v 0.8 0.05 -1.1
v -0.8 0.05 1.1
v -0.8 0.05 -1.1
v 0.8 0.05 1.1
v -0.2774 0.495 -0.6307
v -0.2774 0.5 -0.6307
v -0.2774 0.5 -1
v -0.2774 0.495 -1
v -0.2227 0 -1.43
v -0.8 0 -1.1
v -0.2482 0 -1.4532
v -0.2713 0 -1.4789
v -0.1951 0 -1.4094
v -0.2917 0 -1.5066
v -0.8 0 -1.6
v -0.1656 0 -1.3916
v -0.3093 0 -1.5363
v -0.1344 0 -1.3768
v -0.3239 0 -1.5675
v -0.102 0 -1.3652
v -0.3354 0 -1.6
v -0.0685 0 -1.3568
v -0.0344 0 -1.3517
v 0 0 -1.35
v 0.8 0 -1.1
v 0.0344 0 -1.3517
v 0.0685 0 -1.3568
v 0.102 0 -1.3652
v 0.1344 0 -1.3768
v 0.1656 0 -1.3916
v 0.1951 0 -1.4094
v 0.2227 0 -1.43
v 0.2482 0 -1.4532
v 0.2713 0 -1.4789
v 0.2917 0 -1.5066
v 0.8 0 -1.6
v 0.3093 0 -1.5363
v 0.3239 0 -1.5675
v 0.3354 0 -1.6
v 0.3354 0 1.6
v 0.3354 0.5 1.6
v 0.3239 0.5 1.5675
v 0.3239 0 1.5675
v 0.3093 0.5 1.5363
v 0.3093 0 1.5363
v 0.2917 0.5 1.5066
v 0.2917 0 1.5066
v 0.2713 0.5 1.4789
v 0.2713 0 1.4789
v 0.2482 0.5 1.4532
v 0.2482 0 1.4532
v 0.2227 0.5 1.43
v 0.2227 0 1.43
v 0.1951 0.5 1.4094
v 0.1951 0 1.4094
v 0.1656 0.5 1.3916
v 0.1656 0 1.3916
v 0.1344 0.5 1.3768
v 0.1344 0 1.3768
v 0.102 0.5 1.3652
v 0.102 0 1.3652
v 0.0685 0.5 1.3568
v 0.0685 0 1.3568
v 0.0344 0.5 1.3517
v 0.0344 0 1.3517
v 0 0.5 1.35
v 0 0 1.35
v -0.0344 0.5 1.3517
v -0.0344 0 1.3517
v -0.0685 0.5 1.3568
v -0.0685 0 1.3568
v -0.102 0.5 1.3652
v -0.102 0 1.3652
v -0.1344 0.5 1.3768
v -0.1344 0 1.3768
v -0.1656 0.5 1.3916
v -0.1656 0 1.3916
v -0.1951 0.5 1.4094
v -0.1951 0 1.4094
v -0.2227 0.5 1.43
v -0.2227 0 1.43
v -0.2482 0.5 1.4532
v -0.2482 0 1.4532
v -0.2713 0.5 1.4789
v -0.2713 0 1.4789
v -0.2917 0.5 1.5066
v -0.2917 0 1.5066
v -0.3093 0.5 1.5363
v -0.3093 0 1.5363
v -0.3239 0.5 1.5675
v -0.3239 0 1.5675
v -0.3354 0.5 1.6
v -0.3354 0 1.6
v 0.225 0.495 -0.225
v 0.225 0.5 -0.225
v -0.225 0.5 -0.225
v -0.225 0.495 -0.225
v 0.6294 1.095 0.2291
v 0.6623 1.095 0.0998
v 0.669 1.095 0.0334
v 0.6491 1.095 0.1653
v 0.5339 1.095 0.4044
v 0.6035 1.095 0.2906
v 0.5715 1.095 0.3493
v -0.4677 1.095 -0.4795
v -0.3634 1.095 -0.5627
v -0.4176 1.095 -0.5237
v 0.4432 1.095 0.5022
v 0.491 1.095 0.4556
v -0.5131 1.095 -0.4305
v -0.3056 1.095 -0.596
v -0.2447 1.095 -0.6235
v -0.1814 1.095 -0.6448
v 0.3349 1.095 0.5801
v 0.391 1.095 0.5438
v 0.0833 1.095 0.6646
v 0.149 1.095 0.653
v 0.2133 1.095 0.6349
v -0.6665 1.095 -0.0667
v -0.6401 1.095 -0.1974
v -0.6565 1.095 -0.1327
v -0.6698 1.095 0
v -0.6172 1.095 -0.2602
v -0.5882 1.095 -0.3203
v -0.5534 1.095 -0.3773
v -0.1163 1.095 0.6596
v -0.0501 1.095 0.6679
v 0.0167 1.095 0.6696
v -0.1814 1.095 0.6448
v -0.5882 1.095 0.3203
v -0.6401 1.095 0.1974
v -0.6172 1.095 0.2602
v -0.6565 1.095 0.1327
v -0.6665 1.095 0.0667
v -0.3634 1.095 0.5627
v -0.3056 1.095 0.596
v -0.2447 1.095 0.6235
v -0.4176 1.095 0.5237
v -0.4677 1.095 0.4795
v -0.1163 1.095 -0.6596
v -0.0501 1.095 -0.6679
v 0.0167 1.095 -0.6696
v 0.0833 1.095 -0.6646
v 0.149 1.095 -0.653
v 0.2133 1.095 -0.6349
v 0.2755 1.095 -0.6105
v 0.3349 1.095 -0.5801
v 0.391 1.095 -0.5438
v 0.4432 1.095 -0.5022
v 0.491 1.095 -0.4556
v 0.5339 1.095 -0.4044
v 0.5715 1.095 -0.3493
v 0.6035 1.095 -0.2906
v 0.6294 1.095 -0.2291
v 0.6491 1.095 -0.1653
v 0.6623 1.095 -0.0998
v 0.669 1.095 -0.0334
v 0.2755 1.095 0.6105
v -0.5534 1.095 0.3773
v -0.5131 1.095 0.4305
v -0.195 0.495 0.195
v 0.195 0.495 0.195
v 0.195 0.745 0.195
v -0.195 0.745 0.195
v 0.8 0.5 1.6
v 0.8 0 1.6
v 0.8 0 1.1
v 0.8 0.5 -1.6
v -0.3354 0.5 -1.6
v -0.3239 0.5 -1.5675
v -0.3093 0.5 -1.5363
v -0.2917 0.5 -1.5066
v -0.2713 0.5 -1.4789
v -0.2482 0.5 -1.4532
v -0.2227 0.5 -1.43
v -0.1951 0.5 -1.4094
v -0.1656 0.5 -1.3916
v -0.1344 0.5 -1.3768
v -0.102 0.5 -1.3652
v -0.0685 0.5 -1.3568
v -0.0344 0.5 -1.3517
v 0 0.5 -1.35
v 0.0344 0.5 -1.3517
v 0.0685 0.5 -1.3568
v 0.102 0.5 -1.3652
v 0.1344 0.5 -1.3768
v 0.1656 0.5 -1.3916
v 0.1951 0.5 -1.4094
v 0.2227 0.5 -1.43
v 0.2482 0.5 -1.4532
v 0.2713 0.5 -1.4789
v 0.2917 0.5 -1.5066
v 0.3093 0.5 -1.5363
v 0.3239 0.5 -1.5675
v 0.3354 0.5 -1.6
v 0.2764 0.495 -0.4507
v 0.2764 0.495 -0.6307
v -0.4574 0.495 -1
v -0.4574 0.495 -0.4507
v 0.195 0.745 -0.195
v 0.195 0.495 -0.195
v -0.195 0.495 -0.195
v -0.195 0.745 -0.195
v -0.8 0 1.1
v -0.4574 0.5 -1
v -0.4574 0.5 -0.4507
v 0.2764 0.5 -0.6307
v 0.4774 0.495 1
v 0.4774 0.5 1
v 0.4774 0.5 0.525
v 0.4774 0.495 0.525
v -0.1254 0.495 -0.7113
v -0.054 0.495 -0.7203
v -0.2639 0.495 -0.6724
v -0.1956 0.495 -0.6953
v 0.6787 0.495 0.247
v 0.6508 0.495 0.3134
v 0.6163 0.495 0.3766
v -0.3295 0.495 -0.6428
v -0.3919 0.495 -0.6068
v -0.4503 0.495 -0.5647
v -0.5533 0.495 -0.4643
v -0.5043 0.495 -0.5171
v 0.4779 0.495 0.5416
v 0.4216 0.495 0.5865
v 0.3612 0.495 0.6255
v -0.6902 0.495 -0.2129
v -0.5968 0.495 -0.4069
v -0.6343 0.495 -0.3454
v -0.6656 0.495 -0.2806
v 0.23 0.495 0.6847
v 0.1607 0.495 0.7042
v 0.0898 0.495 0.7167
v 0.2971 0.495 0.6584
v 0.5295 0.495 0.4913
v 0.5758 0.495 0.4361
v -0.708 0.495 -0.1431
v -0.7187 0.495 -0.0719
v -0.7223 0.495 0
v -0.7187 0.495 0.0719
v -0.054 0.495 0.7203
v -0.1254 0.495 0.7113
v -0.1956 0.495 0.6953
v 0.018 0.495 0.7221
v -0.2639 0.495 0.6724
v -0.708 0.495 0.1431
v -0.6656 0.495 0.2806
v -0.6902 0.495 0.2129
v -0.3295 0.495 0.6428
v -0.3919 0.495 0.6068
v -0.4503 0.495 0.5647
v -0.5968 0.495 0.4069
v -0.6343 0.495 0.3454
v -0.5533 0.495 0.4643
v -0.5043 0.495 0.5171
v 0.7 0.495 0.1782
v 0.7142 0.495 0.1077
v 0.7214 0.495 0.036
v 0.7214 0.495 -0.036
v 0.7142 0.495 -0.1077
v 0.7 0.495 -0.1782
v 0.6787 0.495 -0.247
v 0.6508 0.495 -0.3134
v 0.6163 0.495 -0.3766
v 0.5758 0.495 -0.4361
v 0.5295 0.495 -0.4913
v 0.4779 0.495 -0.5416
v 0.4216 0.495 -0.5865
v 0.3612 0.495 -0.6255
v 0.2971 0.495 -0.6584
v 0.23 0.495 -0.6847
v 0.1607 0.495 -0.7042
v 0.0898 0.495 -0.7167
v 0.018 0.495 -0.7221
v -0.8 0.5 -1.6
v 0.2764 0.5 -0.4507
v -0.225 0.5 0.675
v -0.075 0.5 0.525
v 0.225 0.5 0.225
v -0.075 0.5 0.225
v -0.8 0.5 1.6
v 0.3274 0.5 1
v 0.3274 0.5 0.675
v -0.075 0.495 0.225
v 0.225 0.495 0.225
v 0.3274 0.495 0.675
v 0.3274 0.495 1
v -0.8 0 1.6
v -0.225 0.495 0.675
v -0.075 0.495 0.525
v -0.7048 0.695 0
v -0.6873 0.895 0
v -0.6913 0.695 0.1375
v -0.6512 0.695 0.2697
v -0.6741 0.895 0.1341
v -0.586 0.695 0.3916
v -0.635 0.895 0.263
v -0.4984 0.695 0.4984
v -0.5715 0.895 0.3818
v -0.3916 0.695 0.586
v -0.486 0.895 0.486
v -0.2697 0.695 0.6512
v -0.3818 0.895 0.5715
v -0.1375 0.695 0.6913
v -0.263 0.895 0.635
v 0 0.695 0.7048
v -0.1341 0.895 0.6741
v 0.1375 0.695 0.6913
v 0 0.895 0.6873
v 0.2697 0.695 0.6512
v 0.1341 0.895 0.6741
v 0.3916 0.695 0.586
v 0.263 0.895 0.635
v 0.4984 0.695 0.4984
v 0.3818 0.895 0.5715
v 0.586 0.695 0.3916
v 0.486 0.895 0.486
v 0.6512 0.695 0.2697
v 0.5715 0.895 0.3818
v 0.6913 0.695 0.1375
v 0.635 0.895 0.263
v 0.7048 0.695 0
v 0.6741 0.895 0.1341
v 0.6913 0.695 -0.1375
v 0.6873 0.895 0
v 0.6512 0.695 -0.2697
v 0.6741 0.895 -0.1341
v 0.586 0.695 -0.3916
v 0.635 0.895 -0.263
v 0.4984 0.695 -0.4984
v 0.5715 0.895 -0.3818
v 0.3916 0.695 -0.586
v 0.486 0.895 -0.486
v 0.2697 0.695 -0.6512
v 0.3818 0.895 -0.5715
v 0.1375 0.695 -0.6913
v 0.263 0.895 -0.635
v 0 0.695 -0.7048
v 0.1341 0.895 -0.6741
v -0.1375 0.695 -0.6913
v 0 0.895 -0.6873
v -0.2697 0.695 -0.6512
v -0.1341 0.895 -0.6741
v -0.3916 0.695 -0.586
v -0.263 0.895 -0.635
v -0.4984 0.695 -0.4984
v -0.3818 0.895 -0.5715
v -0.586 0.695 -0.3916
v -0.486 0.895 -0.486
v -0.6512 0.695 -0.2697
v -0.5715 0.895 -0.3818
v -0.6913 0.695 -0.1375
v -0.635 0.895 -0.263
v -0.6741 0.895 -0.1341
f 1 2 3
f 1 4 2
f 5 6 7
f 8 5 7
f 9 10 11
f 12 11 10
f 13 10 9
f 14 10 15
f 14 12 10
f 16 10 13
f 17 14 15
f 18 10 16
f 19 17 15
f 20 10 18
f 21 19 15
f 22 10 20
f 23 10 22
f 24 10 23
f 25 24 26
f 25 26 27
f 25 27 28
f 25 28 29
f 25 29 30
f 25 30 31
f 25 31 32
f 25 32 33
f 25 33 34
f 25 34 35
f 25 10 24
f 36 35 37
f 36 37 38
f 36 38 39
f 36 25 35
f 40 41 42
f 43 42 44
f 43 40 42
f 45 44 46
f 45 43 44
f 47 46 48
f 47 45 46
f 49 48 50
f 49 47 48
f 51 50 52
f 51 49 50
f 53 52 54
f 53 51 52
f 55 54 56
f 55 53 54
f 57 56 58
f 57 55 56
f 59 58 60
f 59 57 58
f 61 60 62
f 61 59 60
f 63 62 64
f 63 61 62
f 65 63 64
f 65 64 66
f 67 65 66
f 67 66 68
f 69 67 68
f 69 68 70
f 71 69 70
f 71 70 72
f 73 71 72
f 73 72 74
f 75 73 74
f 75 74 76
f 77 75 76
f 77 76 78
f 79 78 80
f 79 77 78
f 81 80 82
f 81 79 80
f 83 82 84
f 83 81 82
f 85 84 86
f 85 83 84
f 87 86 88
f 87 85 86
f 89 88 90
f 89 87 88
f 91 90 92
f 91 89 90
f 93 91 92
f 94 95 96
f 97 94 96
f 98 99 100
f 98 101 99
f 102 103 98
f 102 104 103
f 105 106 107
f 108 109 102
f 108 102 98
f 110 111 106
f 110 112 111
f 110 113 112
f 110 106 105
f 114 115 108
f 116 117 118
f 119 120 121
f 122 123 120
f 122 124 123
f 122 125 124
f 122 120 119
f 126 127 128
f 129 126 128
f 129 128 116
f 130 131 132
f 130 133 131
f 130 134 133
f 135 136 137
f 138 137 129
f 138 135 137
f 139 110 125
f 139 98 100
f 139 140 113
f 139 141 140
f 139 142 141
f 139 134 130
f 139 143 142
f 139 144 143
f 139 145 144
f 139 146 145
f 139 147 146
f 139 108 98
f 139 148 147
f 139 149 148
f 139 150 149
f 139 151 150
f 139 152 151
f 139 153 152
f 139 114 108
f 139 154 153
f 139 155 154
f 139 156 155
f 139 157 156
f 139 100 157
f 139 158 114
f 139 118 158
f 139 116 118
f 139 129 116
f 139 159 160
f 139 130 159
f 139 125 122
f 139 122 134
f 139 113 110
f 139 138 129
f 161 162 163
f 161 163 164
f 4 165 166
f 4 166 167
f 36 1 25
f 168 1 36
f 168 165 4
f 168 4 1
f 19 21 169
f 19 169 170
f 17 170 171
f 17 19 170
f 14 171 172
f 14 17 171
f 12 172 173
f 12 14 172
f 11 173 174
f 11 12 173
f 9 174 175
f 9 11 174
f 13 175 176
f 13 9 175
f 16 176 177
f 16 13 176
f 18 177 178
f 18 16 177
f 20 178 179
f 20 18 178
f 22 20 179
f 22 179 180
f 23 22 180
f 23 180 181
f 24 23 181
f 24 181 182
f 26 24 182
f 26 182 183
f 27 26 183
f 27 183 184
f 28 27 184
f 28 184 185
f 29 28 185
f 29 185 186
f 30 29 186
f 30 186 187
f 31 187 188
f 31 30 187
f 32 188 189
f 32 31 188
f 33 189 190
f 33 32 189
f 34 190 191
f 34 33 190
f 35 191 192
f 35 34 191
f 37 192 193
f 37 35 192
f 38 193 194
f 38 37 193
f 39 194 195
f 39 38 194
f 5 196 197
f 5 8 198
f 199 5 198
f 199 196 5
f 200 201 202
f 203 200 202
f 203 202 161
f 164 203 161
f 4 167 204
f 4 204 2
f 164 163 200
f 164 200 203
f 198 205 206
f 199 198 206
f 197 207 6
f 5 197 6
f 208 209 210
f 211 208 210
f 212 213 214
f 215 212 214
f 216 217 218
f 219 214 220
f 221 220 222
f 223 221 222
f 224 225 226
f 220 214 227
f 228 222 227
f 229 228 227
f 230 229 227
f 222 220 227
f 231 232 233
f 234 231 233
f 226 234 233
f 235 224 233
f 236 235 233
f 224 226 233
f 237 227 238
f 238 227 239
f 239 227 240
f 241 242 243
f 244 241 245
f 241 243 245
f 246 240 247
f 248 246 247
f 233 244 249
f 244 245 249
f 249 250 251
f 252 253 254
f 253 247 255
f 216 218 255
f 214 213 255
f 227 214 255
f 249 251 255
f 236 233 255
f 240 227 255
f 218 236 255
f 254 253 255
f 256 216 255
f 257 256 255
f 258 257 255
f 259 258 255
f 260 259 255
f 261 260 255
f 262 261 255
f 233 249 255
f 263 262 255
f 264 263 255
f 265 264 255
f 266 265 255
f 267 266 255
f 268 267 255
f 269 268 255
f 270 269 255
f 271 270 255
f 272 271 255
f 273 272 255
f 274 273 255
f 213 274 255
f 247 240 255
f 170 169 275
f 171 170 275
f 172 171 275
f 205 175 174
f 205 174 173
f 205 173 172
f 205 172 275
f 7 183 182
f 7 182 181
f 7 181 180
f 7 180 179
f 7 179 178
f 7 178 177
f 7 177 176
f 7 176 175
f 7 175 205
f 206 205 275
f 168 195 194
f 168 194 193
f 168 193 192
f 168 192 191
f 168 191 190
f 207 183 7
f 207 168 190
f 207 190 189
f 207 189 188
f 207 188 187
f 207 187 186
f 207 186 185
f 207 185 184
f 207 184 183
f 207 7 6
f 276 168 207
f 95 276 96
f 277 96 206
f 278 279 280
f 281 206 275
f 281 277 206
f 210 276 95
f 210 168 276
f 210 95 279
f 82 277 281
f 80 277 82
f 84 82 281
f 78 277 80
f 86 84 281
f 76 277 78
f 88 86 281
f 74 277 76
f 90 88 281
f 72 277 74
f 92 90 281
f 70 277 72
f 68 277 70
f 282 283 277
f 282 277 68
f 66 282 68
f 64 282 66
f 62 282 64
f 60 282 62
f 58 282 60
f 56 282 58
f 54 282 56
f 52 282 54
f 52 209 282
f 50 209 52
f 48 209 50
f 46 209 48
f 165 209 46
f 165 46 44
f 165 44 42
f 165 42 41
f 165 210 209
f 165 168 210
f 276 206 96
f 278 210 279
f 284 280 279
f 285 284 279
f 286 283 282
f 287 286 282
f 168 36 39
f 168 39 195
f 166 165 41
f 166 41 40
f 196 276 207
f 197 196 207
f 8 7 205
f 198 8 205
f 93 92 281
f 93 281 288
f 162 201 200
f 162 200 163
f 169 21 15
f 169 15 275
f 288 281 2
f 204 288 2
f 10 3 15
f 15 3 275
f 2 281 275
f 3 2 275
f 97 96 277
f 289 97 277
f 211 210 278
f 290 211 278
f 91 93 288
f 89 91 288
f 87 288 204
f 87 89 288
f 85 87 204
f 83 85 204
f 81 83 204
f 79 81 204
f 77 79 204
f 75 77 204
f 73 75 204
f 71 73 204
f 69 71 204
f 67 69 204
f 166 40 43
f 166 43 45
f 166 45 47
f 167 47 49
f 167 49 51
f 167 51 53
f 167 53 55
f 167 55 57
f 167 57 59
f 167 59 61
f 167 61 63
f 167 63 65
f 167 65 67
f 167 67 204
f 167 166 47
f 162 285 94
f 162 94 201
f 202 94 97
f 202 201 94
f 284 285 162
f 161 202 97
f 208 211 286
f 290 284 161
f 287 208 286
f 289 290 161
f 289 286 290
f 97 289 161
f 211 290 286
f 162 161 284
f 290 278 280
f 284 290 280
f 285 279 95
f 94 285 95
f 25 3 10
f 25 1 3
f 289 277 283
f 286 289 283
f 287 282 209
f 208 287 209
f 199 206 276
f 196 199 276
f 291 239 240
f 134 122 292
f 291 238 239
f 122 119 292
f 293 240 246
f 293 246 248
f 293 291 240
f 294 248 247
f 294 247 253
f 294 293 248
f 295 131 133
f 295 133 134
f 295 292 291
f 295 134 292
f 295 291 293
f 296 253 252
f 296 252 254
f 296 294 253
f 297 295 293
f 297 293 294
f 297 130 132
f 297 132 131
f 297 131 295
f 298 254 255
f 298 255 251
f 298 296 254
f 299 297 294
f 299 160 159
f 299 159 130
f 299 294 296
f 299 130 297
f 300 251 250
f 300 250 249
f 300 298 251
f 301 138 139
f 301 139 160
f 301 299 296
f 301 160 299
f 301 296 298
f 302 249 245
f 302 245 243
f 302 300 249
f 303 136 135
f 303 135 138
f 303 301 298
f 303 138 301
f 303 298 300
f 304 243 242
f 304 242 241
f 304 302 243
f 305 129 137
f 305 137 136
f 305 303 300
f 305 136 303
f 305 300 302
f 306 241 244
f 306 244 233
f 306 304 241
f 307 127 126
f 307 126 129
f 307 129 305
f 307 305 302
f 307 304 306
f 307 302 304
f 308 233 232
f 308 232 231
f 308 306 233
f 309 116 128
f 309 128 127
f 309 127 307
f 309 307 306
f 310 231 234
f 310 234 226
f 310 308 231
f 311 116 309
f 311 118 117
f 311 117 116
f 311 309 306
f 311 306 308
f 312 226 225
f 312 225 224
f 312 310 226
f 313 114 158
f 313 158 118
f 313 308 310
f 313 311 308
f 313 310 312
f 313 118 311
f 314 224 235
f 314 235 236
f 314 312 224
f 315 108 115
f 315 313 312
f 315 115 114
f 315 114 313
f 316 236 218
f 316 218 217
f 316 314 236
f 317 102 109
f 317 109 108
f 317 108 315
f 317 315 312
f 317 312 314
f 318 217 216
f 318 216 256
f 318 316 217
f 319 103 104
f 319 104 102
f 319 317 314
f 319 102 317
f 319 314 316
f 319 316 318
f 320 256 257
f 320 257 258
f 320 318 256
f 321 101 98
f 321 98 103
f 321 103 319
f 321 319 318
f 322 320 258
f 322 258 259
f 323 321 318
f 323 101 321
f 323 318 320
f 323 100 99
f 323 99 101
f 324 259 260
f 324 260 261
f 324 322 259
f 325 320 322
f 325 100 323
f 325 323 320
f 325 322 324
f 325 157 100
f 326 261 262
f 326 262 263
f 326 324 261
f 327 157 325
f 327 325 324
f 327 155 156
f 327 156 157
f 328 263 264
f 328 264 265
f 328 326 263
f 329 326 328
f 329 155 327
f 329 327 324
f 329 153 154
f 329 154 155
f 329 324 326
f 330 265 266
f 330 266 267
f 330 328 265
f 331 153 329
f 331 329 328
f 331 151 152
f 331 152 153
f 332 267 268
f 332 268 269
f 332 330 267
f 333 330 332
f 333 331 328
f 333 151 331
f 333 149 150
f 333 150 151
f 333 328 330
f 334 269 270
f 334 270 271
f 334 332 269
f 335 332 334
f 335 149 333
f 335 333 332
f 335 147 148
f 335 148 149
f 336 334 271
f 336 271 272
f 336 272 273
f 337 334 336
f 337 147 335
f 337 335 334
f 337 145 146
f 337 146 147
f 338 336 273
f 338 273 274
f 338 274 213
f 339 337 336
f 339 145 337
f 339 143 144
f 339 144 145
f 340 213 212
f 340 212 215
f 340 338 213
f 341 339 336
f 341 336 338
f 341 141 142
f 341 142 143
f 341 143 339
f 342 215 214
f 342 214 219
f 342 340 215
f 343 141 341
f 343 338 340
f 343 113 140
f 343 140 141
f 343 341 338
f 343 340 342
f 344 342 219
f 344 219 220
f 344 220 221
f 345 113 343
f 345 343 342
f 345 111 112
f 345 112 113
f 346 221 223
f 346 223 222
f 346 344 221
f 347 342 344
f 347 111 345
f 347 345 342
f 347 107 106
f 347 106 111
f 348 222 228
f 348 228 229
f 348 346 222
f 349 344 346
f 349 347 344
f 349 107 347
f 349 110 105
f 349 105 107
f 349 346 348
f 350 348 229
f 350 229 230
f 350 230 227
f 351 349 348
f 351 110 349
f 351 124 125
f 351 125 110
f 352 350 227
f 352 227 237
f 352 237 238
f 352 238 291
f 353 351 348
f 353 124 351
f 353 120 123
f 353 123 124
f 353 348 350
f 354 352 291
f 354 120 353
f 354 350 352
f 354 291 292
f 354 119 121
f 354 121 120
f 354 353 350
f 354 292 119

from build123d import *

# Parameters (mm, degrees)
EXTRUDE1_DEPTH      = 0.8
EXTRUDE1_DEPTH_BACK = 0.8
SKETCH2_R           = 0.35
CUT_EXTRUDE1_DEPTH  = 1.5
CUT_EXTRUDE2_DEPTH  = 0.005
SKETCH4_W           = 0.39
SKETCH4_H           = 0.39
EXTRUDE2_DEPTH      = 0.25
SKETCH5_R           = 0.722303879
EXTRUDE3_DEPTH      = 0.6
EXTRUDE3_TAPER      = 5


with BuildPart() as part:
    # Sketch1 → Extrude1 (new body, two sides)
    with BuildSketch(Plane(origin=(0, 0, 0), x_dir=(0, 0, -1), z_dir=(1, 0, 0))) as extrude1_sk:
        Polygon((1.1, 0), (1.6, 0), (1.6, 0.5), (-1.6, 0.5), (-1.6, 0), (-1.1, 0), (-1.1, 0.05), (1.1, 0.05), align=None)
    extrude(amount=EXTRUDE1_DEPTH)
    extrude(extrude1_sk.sketch, amount=-EXTRUDE1_DEPTH_BACK)

    # Sketch2 → Cut-Extrude1 (cut, through all)
    with BuildSketch(Plane(origin=(0, 0, 0), x_dir=(1, 0, 0), z_dir=(0, 1, 0))):
        with Locations((0, 1.7)):
            Circle(SKETCH2_R)
        with Locations((0, -1.7)):
            Circle(SKETCH2_R)
    extrude(amount=CUT_EXTRUDE1_DEPTH, mode=Mode.SUBTRACT)

    # Sketch3 → Cut-Extrude2 (cut)
    with BuildSketch(Plane(origin=(0, 0.5, 0), x_dir=(-1, 0, 0), z_dir=(0, 1, 0))):
        Polygon((-0.225, -0.225), (0.225, -0.225), (0.225, 0.46368555), (0.225, 0.675), (-0.327379025, 0.675), (-0.327379025, 1), (-0.477379025, 1), (-0.477379025, 0.525), (-0.279401067, 0.525), (0.075, 0.525), (0.075, 0.225), (-0.225, 0.225), align=None)
        Polygon((0.45741461, -0.450698672), (-0.276447509, -0.450698672), (-0.276447509, -0.630698672), (0.27741461, -0.630698672), (0.27741461, -1), (0.45741461, -1), align=None)
    extrude(amount=-CUT_EXTRUDE2_DEPTH, mode=Mode.SUBTRACT)

    # Sketch4 → Extrude2 (add)
    with BuildSketch(Plane(origin=(0, 0.495, 0), x_dir=(-1, 0, 0), z_dir=(0, 1, 0))):
        Rectangle(SKETCH4_W, SKETCH4_H)
    extrude(amount=EXTRUDE2_DEPTH)


with BuildPart() as body_2:
    # Sketch5 → Extrude3 (new body)
    with BuildSketch(Plane(origin=(0, 0.495, 0), x_dir=(-1, 0, 0), z_dir=(0, 1, 0))):
        Circle(SKETCH5_R)
    extrude(amount=EXTRUDE3_DEPTH, taper=EXTRUDE3_TAPER)


solid = Compound([part.part, body_2.part])
